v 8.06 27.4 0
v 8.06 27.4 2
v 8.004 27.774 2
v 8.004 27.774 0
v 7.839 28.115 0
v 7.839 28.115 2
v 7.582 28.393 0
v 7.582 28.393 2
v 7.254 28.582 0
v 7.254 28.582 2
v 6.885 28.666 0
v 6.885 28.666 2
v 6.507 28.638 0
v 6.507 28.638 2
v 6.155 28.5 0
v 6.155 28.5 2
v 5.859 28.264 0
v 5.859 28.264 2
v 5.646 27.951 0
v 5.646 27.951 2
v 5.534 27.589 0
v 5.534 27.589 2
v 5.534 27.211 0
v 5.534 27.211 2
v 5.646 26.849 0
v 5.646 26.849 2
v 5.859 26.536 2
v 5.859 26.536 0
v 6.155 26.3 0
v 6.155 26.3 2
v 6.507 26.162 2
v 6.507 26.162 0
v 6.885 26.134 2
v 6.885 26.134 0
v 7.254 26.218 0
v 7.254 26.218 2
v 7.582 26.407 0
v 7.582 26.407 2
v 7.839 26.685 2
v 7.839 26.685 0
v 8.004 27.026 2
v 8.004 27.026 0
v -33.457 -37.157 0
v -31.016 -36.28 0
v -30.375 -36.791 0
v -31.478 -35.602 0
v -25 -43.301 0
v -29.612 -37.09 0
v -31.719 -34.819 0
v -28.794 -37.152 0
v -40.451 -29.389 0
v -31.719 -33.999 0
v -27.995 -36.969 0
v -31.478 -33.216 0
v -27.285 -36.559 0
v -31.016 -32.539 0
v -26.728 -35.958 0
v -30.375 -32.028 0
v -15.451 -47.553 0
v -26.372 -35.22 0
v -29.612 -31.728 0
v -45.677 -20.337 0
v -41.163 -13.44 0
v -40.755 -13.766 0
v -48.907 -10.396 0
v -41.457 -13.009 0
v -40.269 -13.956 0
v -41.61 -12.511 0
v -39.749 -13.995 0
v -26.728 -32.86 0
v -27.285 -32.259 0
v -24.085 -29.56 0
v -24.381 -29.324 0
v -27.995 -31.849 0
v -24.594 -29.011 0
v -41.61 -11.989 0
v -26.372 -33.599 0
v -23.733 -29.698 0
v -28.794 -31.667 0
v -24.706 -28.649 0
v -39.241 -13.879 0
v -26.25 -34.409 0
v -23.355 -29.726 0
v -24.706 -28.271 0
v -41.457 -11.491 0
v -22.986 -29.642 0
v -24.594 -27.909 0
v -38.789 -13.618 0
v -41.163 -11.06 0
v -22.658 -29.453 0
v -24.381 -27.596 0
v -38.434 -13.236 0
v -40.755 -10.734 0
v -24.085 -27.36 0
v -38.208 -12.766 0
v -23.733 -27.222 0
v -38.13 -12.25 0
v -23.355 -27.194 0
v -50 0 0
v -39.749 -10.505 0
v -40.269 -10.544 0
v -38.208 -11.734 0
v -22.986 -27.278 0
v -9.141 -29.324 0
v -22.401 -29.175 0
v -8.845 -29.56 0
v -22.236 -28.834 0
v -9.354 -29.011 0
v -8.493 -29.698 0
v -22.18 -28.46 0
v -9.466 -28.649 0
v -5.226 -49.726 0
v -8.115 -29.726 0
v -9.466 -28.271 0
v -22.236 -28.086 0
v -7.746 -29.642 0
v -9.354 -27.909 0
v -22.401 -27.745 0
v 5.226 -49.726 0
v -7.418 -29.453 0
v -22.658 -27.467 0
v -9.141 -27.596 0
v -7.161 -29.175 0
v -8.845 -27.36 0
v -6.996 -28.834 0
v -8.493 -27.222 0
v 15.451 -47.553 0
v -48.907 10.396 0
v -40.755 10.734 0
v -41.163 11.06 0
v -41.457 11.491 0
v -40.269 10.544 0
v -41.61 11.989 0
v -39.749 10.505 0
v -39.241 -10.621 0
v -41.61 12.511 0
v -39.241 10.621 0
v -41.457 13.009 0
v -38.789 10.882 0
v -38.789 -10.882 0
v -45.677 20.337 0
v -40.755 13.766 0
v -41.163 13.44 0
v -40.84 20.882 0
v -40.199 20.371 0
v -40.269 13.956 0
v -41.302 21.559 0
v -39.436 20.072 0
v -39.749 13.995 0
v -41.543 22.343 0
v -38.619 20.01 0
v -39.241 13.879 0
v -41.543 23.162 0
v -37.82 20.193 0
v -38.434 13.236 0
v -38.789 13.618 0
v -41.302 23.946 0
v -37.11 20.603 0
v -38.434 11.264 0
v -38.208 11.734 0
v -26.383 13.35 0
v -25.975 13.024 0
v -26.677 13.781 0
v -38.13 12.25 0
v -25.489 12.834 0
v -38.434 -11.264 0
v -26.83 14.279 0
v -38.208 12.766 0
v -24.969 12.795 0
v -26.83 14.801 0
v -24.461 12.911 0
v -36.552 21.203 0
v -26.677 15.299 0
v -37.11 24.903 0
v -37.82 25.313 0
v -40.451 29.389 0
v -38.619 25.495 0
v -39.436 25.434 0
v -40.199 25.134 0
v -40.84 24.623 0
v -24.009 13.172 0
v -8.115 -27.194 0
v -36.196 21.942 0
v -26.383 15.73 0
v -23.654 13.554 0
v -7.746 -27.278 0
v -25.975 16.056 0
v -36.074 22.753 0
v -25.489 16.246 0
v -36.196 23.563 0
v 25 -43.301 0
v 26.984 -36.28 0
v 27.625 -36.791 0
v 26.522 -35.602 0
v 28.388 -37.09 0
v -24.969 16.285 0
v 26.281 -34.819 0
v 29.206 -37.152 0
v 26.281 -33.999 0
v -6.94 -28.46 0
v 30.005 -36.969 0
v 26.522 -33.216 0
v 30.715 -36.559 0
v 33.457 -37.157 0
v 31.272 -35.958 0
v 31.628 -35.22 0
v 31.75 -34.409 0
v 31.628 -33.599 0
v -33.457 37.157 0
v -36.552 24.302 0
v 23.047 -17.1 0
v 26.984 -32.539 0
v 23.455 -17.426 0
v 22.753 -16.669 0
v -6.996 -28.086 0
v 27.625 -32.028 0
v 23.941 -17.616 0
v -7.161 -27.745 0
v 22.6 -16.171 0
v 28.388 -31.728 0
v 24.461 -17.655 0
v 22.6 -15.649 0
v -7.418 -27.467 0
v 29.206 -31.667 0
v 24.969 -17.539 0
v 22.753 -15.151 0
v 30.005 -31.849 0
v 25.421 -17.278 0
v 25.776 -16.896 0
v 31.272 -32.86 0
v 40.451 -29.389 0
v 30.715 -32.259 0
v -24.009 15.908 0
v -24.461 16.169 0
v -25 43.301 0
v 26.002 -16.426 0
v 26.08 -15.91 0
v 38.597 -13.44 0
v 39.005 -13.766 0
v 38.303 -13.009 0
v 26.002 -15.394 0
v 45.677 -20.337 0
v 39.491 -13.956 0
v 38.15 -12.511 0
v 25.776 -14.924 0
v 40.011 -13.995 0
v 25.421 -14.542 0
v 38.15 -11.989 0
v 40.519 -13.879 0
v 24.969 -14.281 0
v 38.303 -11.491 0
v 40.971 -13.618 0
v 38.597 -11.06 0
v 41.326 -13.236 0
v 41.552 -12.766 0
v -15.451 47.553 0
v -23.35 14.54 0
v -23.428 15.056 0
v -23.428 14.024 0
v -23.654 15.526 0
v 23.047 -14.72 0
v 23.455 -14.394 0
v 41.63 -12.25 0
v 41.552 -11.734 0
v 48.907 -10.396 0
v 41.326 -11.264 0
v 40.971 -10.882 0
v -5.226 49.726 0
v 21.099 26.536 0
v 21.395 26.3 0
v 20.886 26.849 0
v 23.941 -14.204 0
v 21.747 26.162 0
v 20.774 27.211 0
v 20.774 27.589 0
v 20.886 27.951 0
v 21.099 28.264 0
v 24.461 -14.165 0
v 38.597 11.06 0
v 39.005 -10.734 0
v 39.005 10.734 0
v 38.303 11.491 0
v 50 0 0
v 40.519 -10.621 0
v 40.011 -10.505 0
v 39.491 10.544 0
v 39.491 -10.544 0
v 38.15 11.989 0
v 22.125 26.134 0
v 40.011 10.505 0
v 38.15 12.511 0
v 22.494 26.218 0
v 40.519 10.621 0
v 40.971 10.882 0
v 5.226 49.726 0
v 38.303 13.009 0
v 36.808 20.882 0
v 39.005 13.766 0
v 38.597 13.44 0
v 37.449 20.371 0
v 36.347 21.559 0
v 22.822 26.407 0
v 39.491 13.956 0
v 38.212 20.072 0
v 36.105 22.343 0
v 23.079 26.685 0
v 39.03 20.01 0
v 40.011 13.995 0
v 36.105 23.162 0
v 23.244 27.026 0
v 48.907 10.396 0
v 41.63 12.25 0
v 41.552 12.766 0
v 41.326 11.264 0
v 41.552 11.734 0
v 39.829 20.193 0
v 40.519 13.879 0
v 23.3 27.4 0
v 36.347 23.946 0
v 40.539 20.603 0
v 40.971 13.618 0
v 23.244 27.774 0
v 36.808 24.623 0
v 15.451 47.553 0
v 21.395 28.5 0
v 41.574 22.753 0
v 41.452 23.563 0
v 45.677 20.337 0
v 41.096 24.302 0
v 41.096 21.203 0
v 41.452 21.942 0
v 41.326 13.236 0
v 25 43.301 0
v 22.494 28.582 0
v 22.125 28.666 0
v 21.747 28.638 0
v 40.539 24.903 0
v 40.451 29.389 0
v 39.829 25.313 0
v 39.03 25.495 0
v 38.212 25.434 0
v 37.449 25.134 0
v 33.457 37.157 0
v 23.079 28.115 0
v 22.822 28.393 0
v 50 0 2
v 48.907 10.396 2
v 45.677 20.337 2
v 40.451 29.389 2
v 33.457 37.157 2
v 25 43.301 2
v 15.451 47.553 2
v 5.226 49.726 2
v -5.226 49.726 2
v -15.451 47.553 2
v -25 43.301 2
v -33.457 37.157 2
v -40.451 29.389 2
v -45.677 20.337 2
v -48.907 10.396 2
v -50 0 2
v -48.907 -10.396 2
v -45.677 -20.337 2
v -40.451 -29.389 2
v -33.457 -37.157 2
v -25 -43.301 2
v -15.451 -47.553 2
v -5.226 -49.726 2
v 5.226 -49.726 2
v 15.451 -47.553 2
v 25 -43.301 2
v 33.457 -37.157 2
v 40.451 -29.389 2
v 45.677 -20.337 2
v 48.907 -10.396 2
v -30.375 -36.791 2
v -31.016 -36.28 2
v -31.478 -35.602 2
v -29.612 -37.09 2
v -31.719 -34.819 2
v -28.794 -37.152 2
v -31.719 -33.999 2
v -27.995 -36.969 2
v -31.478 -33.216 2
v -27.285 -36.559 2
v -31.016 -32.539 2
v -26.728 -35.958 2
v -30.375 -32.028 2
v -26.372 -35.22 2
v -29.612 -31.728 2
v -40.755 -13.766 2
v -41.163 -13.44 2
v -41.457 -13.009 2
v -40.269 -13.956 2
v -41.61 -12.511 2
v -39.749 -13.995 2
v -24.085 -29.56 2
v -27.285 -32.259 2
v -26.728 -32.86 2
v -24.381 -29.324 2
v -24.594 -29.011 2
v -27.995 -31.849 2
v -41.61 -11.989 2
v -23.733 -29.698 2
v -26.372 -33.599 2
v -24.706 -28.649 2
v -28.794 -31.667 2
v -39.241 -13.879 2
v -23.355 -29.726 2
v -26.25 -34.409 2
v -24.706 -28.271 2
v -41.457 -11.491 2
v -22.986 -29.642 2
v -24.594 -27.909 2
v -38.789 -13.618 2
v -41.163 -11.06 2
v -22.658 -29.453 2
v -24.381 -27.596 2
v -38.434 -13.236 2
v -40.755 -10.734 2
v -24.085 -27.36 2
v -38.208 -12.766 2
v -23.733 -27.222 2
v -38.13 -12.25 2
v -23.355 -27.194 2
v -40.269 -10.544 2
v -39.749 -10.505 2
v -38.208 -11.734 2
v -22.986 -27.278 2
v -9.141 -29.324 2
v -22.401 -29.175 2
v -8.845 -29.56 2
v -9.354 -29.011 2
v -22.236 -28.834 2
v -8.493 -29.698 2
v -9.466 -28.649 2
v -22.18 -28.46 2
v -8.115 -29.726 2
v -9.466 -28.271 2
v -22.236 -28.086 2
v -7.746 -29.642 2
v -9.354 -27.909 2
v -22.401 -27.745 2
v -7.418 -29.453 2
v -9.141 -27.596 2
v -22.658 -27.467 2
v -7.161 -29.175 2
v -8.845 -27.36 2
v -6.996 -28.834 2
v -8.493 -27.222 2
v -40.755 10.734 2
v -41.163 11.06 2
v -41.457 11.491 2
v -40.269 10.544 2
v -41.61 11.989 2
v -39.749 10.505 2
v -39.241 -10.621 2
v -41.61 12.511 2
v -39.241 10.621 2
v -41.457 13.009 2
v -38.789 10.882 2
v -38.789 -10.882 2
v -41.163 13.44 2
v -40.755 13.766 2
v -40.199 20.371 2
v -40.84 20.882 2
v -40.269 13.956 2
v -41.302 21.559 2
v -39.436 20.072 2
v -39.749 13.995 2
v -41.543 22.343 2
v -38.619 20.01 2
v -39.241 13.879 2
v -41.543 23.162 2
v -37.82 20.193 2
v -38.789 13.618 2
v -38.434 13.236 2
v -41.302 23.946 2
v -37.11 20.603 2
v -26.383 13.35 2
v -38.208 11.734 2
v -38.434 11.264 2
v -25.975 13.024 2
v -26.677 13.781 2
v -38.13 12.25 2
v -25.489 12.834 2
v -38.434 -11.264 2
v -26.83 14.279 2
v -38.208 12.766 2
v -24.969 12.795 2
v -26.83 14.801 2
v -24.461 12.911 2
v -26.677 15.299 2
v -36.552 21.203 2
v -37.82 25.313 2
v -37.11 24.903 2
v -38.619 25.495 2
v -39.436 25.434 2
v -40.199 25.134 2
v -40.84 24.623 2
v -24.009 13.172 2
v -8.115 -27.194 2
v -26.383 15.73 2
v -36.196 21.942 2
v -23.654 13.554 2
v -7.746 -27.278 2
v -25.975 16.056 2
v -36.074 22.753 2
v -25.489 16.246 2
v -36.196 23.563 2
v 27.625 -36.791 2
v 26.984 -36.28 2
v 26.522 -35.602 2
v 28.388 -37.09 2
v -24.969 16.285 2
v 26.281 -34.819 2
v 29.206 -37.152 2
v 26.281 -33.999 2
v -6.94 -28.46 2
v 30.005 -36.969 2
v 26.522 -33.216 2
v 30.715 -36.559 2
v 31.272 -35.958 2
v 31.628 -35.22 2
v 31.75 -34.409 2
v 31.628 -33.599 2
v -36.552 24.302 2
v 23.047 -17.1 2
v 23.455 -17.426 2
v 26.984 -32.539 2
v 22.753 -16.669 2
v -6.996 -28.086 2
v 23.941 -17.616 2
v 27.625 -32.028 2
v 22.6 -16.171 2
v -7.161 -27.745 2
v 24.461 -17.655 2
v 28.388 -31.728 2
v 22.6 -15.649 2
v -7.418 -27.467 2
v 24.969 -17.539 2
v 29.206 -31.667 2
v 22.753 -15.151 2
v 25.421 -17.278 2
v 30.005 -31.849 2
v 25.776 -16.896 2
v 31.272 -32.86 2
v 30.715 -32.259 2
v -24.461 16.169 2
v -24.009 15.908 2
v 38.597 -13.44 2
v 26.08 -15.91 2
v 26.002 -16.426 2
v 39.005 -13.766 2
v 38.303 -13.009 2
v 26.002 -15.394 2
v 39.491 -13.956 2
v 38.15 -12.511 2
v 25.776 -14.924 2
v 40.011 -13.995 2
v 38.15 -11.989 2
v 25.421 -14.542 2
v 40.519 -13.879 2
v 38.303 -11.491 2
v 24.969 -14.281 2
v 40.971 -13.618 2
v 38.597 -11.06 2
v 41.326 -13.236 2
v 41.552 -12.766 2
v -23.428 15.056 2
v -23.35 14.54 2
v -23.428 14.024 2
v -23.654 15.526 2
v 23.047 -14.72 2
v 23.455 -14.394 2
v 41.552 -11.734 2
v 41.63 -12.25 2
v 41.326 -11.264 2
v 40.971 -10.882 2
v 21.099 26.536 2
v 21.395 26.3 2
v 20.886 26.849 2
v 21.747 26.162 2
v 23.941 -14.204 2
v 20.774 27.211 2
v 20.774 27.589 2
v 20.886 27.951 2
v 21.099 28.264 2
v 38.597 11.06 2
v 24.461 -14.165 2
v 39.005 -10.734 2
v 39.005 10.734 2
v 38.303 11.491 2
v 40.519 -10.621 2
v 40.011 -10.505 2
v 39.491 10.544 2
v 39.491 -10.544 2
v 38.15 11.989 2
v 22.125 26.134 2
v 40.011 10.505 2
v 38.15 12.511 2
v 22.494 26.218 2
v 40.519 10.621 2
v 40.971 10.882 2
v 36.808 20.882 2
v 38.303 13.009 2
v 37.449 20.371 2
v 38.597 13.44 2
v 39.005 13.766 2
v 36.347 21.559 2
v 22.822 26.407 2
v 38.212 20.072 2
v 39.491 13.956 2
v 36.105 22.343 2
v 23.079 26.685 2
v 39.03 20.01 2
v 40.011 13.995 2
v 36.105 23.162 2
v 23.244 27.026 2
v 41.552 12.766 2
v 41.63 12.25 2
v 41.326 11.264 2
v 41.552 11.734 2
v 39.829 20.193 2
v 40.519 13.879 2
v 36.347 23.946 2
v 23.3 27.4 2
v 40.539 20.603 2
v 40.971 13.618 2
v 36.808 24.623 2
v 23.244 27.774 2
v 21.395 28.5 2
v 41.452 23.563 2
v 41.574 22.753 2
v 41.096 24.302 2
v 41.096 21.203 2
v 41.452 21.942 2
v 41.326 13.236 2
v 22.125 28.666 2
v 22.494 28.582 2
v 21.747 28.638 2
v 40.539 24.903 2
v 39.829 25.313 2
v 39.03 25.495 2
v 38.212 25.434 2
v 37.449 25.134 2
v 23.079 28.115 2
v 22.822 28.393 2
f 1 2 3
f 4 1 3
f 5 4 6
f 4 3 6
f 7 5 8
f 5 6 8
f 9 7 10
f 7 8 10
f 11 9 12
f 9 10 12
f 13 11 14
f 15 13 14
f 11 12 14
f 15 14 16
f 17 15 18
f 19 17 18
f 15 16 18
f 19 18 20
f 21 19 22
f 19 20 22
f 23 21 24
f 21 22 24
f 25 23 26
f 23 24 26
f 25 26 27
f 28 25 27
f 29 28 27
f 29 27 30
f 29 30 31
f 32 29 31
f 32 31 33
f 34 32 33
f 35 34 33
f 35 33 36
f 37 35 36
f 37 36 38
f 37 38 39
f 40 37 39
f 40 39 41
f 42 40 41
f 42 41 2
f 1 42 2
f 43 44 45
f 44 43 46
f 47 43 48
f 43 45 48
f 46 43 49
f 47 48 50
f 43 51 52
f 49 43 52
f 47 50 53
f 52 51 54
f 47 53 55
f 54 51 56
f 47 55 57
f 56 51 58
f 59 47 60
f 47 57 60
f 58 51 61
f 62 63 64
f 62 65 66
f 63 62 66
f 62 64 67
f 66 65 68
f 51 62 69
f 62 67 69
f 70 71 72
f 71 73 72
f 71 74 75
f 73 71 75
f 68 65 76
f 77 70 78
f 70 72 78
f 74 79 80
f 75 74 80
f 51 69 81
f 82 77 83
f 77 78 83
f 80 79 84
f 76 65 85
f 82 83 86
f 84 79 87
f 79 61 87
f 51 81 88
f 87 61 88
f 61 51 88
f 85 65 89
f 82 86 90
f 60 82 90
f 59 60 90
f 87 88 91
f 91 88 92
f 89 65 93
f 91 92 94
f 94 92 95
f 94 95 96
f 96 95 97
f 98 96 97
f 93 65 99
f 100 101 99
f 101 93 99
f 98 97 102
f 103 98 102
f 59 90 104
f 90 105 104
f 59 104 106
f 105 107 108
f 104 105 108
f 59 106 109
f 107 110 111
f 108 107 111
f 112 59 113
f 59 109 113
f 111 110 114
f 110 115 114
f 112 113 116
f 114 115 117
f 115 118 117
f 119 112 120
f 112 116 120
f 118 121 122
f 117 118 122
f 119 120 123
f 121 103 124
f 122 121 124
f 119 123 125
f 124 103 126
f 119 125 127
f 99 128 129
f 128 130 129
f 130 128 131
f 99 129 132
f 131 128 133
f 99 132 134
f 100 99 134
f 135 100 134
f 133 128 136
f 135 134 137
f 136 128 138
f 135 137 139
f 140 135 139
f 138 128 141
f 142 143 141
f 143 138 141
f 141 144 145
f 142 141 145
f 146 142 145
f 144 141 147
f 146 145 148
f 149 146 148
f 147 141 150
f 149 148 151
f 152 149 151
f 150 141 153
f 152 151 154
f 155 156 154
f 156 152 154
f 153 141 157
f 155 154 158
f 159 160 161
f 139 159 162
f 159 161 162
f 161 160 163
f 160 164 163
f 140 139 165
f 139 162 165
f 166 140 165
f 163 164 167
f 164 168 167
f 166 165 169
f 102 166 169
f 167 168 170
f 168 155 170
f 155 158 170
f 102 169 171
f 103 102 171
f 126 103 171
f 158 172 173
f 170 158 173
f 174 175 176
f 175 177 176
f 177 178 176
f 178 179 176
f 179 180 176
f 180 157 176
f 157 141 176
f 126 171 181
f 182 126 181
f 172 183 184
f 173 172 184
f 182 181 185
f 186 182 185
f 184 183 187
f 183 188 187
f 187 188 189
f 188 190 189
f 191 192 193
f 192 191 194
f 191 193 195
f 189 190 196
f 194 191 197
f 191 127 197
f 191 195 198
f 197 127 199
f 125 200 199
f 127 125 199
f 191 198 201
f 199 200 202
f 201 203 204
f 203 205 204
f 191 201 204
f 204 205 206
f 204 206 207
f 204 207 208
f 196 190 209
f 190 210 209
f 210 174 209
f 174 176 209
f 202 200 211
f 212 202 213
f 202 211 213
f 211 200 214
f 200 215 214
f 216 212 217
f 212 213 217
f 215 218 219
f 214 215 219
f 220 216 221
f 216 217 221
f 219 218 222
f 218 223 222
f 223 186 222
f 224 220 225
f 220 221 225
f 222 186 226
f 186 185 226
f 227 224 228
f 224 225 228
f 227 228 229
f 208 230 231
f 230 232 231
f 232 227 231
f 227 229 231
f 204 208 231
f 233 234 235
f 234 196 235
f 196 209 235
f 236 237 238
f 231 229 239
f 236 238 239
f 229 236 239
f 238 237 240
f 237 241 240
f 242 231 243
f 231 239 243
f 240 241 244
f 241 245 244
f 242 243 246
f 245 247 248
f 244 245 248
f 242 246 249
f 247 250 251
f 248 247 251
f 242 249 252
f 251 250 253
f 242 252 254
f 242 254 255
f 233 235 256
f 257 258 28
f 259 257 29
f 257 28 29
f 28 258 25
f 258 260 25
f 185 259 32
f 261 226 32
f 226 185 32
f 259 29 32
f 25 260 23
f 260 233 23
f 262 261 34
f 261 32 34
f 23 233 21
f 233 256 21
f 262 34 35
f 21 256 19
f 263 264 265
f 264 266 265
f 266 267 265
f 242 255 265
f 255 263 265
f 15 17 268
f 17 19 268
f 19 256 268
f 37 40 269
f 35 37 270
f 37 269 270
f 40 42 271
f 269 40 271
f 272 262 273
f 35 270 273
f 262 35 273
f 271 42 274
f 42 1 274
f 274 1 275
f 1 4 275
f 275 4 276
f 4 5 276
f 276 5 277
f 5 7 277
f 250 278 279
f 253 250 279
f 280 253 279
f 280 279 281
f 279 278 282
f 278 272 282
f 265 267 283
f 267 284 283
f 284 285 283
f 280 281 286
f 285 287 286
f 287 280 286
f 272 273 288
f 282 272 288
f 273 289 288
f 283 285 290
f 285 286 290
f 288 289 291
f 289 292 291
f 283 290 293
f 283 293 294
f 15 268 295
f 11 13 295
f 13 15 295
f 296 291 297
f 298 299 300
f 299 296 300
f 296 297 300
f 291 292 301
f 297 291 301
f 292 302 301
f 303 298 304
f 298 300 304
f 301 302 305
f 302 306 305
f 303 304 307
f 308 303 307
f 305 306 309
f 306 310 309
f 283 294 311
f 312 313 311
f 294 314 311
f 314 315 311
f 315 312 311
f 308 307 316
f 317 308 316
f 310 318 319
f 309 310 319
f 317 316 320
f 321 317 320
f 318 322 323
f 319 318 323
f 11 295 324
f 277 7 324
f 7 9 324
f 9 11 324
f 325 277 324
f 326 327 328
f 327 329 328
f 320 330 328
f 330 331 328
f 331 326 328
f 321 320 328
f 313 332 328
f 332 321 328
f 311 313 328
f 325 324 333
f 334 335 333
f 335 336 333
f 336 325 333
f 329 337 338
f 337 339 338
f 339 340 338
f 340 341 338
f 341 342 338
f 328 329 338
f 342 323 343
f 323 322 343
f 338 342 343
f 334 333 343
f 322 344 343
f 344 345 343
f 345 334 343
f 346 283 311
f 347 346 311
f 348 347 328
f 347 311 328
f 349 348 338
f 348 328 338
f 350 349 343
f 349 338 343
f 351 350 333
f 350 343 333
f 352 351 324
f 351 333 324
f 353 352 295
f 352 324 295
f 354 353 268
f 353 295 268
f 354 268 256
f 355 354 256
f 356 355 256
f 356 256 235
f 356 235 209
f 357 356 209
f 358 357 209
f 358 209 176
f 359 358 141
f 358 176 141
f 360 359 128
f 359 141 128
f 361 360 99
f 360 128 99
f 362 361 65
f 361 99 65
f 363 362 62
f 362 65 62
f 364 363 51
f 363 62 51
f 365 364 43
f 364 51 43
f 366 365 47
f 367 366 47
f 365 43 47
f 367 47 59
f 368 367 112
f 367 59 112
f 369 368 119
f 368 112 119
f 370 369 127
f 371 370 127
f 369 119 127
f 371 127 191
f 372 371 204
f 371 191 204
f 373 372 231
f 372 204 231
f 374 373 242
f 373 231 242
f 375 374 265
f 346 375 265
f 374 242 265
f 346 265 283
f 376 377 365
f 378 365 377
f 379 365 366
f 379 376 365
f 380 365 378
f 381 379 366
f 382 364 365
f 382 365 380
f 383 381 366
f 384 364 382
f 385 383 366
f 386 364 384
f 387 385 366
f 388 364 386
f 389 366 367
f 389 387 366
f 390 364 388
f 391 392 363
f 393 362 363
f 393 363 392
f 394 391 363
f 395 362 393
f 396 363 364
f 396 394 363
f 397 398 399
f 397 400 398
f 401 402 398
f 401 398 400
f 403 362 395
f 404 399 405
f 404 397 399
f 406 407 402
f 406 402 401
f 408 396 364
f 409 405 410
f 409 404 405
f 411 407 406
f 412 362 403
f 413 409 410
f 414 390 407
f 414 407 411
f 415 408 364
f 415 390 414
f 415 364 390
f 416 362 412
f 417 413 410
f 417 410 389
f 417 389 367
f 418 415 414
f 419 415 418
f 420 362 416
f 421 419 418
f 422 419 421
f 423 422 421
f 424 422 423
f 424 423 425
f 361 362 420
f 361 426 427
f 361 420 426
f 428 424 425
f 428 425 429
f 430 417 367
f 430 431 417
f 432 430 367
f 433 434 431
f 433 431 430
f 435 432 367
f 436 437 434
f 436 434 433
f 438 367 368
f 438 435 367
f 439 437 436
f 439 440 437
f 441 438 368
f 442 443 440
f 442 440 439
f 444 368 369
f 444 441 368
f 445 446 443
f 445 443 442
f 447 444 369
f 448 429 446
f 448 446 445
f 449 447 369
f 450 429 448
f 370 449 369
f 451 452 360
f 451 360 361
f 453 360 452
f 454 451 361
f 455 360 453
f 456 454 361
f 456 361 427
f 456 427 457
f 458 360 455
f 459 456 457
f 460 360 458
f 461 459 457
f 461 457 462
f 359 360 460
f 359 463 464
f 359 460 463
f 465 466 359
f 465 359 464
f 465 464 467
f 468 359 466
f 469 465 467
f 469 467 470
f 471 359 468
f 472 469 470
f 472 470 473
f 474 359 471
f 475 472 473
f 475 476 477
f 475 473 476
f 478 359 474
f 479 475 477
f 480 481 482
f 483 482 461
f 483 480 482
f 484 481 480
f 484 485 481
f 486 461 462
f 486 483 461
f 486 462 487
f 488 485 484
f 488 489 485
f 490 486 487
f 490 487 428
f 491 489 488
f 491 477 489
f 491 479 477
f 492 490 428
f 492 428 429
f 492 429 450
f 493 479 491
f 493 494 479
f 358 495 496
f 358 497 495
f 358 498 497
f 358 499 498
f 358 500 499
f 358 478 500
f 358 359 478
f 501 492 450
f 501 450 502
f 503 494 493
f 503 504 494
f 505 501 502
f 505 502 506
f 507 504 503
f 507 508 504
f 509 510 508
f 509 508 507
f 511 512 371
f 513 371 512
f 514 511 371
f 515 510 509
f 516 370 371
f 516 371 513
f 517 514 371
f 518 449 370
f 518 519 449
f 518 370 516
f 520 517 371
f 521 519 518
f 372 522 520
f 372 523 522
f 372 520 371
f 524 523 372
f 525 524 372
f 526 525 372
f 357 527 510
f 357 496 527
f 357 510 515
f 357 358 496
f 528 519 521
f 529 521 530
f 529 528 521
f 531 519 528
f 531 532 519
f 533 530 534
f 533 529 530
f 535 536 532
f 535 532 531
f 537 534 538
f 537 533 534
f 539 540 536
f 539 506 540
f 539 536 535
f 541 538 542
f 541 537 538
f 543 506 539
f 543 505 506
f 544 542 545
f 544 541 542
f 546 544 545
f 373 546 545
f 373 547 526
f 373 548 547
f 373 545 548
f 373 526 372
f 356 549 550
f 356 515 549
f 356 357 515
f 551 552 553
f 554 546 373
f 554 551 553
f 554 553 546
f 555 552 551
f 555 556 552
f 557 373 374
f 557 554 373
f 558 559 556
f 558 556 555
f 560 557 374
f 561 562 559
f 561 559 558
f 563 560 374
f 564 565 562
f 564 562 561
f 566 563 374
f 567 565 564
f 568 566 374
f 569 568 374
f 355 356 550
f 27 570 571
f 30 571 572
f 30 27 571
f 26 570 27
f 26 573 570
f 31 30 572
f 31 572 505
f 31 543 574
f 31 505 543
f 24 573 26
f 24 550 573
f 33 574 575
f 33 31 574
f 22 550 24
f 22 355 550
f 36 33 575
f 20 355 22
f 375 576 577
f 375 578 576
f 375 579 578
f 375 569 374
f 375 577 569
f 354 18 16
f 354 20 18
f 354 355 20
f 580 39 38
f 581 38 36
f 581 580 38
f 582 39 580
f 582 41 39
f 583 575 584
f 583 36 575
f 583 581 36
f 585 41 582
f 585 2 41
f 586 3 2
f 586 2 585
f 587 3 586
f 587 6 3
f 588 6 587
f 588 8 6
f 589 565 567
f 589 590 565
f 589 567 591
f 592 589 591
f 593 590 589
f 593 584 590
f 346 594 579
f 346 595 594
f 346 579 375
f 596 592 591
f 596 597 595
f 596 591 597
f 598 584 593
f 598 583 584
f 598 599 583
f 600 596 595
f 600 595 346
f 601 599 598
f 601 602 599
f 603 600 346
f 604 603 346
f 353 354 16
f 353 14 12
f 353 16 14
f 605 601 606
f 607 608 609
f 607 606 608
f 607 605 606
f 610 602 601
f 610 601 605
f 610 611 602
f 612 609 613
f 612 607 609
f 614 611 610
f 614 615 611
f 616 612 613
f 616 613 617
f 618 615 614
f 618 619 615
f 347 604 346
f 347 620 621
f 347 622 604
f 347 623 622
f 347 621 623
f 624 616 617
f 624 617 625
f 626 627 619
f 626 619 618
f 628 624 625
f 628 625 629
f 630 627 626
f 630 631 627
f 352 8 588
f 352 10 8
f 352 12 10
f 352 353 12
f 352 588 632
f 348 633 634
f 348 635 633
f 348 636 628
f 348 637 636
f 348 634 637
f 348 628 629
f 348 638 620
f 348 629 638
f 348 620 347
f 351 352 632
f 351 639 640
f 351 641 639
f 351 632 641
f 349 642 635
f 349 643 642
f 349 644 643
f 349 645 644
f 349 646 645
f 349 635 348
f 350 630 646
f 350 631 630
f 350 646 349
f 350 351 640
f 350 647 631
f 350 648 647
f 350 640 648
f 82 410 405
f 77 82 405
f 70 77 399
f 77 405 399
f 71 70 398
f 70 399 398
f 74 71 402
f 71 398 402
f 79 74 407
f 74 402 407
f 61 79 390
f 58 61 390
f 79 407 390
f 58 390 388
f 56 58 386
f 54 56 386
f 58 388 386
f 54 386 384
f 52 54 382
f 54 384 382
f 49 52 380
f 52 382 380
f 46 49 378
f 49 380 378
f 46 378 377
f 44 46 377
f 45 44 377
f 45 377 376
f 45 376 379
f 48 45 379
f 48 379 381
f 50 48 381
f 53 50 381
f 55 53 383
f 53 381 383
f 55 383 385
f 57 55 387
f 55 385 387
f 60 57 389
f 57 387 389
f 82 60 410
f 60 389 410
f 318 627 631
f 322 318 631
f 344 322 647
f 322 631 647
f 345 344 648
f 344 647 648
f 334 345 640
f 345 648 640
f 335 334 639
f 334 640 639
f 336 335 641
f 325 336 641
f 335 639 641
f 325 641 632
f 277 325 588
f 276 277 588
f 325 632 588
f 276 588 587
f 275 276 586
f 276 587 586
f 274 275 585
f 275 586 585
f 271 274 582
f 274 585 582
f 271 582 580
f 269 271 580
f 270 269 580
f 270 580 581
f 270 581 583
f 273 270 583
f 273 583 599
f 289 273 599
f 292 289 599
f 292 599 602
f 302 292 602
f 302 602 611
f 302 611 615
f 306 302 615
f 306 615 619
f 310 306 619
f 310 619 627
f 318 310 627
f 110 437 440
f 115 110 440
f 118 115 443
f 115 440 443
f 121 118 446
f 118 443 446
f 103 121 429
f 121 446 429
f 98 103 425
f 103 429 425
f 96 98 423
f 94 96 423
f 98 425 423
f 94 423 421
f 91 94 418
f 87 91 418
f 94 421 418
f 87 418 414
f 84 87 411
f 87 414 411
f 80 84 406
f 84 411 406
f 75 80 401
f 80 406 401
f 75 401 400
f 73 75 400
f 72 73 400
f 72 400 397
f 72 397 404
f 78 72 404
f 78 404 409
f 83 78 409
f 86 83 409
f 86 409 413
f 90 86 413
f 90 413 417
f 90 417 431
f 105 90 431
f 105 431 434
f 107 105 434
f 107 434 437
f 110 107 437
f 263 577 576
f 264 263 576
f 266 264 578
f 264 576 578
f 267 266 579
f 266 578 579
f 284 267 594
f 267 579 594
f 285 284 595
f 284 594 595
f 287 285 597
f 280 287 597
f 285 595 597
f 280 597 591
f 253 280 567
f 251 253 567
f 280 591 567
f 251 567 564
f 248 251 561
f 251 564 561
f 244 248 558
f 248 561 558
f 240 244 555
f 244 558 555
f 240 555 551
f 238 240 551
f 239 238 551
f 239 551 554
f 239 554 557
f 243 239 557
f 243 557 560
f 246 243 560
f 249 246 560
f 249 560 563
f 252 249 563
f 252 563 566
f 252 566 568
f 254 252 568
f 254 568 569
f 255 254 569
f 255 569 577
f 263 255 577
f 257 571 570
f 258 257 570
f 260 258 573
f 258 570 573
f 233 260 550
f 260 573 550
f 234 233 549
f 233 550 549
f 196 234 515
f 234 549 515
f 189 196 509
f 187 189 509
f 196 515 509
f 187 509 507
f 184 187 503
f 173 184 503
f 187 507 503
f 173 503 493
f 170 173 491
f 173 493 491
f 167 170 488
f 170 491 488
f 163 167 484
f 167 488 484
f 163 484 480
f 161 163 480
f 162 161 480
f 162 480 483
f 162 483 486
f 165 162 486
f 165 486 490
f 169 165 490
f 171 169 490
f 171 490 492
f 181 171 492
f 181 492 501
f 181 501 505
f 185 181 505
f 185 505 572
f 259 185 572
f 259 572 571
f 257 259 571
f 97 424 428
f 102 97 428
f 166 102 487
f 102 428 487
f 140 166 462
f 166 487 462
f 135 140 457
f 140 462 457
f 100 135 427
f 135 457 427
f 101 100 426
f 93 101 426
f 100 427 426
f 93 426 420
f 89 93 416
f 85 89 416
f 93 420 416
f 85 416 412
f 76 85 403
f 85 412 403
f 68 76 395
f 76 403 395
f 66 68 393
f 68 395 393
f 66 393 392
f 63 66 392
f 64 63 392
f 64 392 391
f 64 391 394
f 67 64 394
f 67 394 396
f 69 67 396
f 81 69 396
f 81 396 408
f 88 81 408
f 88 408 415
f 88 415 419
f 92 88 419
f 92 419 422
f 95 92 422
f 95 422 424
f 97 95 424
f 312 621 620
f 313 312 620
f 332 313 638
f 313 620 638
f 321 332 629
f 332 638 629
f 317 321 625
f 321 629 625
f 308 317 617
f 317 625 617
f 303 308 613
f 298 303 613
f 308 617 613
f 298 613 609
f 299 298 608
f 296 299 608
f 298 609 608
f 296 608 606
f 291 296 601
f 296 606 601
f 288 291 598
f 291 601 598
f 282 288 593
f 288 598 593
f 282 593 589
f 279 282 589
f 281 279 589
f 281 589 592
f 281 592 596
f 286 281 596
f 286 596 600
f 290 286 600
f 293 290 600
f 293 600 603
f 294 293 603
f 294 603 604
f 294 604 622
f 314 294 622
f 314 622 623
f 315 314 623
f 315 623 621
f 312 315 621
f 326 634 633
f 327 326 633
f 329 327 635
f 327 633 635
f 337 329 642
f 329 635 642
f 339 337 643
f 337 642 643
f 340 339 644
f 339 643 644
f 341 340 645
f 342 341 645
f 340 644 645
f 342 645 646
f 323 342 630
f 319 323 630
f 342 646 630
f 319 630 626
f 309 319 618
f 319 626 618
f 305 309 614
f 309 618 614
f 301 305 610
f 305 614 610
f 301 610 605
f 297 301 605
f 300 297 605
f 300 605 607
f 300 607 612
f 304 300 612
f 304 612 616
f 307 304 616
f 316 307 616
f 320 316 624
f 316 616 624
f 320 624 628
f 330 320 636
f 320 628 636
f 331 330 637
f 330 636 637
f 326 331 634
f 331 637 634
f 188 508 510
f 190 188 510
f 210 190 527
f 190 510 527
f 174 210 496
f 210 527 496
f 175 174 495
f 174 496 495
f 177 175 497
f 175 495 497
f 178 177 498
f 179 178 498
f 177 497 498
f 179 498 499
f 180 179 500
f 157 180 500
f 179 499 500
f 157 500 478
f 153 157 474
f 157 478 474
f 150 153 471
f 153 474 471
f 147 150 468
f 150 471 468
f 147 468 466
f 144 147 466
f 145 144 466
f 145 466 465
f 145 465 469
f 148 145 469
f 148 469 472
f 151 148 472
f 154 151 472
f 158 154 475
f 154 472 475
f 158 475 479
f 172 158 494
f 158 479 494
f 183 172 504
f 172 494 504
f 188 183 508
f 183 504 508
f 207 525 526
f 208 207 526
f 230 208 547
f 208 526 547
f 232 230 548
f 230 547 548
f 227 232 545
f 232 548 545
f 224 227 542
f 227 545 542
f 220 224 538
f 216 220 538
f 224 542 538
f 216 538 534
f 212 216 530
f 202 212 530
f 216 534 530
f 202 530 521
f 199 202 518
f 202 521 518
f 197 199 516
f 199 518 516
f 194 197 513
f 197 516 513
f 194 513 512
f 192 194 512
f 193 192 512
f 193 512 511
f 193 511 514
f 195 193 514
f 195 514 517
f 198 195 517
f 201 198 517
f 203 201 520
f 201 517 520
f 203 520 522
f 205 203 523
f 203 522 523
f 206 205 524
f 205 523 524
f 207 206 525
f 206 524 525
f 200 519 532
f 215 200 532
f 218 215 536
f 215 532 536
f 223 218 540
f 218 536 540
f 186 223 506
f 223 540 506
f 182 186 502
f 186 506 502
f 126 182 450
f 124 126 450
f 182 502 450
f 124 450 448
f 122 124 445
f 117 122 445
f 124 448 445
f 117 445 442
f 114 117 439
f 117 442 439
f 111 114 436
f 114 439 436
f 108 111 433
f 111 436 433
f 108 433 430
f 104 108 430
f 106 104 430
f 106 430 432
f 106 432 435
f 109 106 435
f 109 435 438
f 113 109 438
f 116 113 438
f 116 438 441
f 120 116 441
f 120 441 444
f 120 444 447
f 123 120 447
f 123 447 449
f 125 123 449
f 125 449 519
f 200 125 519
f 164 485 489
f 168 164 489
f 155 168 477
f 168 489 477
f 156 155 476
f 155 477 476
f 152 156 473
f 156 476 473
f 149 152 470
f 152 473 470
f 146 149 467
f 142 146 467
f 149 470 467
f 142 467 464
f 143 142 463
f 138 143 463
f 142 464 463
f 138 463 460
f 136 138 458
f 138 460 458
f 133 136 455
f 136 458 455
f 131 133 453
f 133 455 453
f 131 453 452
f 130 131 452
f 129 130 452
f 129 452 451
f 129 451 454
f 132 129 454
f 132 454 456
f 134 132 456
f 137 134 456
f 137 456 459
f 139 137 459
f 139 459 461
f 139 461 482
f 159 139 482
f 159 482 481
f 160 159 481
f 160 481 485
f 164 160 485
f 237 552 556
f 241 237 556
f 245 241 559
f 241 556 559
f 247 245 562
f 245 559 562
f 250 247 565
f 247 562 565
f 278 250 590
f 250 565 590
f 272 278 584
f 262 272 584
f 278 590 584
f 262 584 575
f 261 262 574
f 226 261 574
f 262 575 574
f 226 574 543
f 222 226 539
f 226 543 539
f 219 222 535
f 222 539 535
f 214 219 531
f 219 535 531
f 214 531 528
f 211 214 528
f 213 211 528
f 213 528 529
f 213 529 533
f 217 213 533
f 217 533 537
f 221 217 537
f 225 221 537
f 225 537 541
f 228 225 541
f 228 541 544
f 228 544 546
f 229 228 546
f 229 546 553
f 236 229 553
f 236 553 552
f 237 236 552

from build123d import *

# Parameters (mm, degrees)
ESBO_O1_R                = 50
RESSALTO_EXTRUS_O1_DEPTH = 2
ESBO_O2_R                = 2.75
CORTE_EXTRUS_O1_DEPTH    = 2
ESBO_O3_R                = 1.75
ESBO_O3_R_2              = 1.27
CORTE_EXTRUS_O2_DEPTH    = 10


with BuildPart() as part:
    # Esboço1 → Ressalto-extrusão1 (new body)
    with BuildSketch(Plane.XY):
        Circle(ESBO_O1_R)
    extrude(amount=RESSALTO_EXTRUS_O1_DEPTH)

    # Esboço2 → Corte-extrusão1 (cut)
    with BuildSketch(Plane.XY.offset(2)):
        with Locations((-29, -34.409301068)):
            Circle(ESBO_O2_R)
        with Locations((29, -34.409301068)):
            Circle(ESBO_O2_R)
        with Locations((-38.824197531, 22.752619324)):
            Circle(ESBO_O2_R)
        with Locations((38.824197531, 22.752619324)):
            Circle(ESBO_O2_R)
    extrude(amount=-CORTE_EXTRUS_O1_DEPTH, mode=Mode.SUBTRACT)

    # Esboço3 → Corte-extrusão2 (cut)
    with BuildSketch(Plane.XY.offset(2)):
        with Locations((-25.1, 14.54)):
            Circle(ESBO_O3_R)
        with Locations((24.33, -15.91)):
            Circle(ESBO_O3_R)
        with Locations((-39.88, -12.25)):
            Circle(ESBO_O3_R)
        with Locations((-39.88, 12.25)):
            Circle(ESBO_O3_R)
        with Locations((39.88, 12.25)):
            Circle(ESBO_O3_R)
        with Locations((39.88, -12.25)):
            Circle(ESBO_O3_R)
        with Locations((6.79, 27.4)):
            Circle(ESBO_O3_R_2)
        with Locations((22.03, 27.4)):
            Circle(ESBO_O3_R_2)
        with Locations((-8.21, -28.46)):
            Circle(ESBO_O3_R_2)
        with Locations((-23.45, -28.46)):
            Circle(ESBO_O3_R_2)
    extrude(amount=-CORTE_EXTRUS_O2_DEPTH, mode=Mode.SUBTRACT)


solid = part.part
